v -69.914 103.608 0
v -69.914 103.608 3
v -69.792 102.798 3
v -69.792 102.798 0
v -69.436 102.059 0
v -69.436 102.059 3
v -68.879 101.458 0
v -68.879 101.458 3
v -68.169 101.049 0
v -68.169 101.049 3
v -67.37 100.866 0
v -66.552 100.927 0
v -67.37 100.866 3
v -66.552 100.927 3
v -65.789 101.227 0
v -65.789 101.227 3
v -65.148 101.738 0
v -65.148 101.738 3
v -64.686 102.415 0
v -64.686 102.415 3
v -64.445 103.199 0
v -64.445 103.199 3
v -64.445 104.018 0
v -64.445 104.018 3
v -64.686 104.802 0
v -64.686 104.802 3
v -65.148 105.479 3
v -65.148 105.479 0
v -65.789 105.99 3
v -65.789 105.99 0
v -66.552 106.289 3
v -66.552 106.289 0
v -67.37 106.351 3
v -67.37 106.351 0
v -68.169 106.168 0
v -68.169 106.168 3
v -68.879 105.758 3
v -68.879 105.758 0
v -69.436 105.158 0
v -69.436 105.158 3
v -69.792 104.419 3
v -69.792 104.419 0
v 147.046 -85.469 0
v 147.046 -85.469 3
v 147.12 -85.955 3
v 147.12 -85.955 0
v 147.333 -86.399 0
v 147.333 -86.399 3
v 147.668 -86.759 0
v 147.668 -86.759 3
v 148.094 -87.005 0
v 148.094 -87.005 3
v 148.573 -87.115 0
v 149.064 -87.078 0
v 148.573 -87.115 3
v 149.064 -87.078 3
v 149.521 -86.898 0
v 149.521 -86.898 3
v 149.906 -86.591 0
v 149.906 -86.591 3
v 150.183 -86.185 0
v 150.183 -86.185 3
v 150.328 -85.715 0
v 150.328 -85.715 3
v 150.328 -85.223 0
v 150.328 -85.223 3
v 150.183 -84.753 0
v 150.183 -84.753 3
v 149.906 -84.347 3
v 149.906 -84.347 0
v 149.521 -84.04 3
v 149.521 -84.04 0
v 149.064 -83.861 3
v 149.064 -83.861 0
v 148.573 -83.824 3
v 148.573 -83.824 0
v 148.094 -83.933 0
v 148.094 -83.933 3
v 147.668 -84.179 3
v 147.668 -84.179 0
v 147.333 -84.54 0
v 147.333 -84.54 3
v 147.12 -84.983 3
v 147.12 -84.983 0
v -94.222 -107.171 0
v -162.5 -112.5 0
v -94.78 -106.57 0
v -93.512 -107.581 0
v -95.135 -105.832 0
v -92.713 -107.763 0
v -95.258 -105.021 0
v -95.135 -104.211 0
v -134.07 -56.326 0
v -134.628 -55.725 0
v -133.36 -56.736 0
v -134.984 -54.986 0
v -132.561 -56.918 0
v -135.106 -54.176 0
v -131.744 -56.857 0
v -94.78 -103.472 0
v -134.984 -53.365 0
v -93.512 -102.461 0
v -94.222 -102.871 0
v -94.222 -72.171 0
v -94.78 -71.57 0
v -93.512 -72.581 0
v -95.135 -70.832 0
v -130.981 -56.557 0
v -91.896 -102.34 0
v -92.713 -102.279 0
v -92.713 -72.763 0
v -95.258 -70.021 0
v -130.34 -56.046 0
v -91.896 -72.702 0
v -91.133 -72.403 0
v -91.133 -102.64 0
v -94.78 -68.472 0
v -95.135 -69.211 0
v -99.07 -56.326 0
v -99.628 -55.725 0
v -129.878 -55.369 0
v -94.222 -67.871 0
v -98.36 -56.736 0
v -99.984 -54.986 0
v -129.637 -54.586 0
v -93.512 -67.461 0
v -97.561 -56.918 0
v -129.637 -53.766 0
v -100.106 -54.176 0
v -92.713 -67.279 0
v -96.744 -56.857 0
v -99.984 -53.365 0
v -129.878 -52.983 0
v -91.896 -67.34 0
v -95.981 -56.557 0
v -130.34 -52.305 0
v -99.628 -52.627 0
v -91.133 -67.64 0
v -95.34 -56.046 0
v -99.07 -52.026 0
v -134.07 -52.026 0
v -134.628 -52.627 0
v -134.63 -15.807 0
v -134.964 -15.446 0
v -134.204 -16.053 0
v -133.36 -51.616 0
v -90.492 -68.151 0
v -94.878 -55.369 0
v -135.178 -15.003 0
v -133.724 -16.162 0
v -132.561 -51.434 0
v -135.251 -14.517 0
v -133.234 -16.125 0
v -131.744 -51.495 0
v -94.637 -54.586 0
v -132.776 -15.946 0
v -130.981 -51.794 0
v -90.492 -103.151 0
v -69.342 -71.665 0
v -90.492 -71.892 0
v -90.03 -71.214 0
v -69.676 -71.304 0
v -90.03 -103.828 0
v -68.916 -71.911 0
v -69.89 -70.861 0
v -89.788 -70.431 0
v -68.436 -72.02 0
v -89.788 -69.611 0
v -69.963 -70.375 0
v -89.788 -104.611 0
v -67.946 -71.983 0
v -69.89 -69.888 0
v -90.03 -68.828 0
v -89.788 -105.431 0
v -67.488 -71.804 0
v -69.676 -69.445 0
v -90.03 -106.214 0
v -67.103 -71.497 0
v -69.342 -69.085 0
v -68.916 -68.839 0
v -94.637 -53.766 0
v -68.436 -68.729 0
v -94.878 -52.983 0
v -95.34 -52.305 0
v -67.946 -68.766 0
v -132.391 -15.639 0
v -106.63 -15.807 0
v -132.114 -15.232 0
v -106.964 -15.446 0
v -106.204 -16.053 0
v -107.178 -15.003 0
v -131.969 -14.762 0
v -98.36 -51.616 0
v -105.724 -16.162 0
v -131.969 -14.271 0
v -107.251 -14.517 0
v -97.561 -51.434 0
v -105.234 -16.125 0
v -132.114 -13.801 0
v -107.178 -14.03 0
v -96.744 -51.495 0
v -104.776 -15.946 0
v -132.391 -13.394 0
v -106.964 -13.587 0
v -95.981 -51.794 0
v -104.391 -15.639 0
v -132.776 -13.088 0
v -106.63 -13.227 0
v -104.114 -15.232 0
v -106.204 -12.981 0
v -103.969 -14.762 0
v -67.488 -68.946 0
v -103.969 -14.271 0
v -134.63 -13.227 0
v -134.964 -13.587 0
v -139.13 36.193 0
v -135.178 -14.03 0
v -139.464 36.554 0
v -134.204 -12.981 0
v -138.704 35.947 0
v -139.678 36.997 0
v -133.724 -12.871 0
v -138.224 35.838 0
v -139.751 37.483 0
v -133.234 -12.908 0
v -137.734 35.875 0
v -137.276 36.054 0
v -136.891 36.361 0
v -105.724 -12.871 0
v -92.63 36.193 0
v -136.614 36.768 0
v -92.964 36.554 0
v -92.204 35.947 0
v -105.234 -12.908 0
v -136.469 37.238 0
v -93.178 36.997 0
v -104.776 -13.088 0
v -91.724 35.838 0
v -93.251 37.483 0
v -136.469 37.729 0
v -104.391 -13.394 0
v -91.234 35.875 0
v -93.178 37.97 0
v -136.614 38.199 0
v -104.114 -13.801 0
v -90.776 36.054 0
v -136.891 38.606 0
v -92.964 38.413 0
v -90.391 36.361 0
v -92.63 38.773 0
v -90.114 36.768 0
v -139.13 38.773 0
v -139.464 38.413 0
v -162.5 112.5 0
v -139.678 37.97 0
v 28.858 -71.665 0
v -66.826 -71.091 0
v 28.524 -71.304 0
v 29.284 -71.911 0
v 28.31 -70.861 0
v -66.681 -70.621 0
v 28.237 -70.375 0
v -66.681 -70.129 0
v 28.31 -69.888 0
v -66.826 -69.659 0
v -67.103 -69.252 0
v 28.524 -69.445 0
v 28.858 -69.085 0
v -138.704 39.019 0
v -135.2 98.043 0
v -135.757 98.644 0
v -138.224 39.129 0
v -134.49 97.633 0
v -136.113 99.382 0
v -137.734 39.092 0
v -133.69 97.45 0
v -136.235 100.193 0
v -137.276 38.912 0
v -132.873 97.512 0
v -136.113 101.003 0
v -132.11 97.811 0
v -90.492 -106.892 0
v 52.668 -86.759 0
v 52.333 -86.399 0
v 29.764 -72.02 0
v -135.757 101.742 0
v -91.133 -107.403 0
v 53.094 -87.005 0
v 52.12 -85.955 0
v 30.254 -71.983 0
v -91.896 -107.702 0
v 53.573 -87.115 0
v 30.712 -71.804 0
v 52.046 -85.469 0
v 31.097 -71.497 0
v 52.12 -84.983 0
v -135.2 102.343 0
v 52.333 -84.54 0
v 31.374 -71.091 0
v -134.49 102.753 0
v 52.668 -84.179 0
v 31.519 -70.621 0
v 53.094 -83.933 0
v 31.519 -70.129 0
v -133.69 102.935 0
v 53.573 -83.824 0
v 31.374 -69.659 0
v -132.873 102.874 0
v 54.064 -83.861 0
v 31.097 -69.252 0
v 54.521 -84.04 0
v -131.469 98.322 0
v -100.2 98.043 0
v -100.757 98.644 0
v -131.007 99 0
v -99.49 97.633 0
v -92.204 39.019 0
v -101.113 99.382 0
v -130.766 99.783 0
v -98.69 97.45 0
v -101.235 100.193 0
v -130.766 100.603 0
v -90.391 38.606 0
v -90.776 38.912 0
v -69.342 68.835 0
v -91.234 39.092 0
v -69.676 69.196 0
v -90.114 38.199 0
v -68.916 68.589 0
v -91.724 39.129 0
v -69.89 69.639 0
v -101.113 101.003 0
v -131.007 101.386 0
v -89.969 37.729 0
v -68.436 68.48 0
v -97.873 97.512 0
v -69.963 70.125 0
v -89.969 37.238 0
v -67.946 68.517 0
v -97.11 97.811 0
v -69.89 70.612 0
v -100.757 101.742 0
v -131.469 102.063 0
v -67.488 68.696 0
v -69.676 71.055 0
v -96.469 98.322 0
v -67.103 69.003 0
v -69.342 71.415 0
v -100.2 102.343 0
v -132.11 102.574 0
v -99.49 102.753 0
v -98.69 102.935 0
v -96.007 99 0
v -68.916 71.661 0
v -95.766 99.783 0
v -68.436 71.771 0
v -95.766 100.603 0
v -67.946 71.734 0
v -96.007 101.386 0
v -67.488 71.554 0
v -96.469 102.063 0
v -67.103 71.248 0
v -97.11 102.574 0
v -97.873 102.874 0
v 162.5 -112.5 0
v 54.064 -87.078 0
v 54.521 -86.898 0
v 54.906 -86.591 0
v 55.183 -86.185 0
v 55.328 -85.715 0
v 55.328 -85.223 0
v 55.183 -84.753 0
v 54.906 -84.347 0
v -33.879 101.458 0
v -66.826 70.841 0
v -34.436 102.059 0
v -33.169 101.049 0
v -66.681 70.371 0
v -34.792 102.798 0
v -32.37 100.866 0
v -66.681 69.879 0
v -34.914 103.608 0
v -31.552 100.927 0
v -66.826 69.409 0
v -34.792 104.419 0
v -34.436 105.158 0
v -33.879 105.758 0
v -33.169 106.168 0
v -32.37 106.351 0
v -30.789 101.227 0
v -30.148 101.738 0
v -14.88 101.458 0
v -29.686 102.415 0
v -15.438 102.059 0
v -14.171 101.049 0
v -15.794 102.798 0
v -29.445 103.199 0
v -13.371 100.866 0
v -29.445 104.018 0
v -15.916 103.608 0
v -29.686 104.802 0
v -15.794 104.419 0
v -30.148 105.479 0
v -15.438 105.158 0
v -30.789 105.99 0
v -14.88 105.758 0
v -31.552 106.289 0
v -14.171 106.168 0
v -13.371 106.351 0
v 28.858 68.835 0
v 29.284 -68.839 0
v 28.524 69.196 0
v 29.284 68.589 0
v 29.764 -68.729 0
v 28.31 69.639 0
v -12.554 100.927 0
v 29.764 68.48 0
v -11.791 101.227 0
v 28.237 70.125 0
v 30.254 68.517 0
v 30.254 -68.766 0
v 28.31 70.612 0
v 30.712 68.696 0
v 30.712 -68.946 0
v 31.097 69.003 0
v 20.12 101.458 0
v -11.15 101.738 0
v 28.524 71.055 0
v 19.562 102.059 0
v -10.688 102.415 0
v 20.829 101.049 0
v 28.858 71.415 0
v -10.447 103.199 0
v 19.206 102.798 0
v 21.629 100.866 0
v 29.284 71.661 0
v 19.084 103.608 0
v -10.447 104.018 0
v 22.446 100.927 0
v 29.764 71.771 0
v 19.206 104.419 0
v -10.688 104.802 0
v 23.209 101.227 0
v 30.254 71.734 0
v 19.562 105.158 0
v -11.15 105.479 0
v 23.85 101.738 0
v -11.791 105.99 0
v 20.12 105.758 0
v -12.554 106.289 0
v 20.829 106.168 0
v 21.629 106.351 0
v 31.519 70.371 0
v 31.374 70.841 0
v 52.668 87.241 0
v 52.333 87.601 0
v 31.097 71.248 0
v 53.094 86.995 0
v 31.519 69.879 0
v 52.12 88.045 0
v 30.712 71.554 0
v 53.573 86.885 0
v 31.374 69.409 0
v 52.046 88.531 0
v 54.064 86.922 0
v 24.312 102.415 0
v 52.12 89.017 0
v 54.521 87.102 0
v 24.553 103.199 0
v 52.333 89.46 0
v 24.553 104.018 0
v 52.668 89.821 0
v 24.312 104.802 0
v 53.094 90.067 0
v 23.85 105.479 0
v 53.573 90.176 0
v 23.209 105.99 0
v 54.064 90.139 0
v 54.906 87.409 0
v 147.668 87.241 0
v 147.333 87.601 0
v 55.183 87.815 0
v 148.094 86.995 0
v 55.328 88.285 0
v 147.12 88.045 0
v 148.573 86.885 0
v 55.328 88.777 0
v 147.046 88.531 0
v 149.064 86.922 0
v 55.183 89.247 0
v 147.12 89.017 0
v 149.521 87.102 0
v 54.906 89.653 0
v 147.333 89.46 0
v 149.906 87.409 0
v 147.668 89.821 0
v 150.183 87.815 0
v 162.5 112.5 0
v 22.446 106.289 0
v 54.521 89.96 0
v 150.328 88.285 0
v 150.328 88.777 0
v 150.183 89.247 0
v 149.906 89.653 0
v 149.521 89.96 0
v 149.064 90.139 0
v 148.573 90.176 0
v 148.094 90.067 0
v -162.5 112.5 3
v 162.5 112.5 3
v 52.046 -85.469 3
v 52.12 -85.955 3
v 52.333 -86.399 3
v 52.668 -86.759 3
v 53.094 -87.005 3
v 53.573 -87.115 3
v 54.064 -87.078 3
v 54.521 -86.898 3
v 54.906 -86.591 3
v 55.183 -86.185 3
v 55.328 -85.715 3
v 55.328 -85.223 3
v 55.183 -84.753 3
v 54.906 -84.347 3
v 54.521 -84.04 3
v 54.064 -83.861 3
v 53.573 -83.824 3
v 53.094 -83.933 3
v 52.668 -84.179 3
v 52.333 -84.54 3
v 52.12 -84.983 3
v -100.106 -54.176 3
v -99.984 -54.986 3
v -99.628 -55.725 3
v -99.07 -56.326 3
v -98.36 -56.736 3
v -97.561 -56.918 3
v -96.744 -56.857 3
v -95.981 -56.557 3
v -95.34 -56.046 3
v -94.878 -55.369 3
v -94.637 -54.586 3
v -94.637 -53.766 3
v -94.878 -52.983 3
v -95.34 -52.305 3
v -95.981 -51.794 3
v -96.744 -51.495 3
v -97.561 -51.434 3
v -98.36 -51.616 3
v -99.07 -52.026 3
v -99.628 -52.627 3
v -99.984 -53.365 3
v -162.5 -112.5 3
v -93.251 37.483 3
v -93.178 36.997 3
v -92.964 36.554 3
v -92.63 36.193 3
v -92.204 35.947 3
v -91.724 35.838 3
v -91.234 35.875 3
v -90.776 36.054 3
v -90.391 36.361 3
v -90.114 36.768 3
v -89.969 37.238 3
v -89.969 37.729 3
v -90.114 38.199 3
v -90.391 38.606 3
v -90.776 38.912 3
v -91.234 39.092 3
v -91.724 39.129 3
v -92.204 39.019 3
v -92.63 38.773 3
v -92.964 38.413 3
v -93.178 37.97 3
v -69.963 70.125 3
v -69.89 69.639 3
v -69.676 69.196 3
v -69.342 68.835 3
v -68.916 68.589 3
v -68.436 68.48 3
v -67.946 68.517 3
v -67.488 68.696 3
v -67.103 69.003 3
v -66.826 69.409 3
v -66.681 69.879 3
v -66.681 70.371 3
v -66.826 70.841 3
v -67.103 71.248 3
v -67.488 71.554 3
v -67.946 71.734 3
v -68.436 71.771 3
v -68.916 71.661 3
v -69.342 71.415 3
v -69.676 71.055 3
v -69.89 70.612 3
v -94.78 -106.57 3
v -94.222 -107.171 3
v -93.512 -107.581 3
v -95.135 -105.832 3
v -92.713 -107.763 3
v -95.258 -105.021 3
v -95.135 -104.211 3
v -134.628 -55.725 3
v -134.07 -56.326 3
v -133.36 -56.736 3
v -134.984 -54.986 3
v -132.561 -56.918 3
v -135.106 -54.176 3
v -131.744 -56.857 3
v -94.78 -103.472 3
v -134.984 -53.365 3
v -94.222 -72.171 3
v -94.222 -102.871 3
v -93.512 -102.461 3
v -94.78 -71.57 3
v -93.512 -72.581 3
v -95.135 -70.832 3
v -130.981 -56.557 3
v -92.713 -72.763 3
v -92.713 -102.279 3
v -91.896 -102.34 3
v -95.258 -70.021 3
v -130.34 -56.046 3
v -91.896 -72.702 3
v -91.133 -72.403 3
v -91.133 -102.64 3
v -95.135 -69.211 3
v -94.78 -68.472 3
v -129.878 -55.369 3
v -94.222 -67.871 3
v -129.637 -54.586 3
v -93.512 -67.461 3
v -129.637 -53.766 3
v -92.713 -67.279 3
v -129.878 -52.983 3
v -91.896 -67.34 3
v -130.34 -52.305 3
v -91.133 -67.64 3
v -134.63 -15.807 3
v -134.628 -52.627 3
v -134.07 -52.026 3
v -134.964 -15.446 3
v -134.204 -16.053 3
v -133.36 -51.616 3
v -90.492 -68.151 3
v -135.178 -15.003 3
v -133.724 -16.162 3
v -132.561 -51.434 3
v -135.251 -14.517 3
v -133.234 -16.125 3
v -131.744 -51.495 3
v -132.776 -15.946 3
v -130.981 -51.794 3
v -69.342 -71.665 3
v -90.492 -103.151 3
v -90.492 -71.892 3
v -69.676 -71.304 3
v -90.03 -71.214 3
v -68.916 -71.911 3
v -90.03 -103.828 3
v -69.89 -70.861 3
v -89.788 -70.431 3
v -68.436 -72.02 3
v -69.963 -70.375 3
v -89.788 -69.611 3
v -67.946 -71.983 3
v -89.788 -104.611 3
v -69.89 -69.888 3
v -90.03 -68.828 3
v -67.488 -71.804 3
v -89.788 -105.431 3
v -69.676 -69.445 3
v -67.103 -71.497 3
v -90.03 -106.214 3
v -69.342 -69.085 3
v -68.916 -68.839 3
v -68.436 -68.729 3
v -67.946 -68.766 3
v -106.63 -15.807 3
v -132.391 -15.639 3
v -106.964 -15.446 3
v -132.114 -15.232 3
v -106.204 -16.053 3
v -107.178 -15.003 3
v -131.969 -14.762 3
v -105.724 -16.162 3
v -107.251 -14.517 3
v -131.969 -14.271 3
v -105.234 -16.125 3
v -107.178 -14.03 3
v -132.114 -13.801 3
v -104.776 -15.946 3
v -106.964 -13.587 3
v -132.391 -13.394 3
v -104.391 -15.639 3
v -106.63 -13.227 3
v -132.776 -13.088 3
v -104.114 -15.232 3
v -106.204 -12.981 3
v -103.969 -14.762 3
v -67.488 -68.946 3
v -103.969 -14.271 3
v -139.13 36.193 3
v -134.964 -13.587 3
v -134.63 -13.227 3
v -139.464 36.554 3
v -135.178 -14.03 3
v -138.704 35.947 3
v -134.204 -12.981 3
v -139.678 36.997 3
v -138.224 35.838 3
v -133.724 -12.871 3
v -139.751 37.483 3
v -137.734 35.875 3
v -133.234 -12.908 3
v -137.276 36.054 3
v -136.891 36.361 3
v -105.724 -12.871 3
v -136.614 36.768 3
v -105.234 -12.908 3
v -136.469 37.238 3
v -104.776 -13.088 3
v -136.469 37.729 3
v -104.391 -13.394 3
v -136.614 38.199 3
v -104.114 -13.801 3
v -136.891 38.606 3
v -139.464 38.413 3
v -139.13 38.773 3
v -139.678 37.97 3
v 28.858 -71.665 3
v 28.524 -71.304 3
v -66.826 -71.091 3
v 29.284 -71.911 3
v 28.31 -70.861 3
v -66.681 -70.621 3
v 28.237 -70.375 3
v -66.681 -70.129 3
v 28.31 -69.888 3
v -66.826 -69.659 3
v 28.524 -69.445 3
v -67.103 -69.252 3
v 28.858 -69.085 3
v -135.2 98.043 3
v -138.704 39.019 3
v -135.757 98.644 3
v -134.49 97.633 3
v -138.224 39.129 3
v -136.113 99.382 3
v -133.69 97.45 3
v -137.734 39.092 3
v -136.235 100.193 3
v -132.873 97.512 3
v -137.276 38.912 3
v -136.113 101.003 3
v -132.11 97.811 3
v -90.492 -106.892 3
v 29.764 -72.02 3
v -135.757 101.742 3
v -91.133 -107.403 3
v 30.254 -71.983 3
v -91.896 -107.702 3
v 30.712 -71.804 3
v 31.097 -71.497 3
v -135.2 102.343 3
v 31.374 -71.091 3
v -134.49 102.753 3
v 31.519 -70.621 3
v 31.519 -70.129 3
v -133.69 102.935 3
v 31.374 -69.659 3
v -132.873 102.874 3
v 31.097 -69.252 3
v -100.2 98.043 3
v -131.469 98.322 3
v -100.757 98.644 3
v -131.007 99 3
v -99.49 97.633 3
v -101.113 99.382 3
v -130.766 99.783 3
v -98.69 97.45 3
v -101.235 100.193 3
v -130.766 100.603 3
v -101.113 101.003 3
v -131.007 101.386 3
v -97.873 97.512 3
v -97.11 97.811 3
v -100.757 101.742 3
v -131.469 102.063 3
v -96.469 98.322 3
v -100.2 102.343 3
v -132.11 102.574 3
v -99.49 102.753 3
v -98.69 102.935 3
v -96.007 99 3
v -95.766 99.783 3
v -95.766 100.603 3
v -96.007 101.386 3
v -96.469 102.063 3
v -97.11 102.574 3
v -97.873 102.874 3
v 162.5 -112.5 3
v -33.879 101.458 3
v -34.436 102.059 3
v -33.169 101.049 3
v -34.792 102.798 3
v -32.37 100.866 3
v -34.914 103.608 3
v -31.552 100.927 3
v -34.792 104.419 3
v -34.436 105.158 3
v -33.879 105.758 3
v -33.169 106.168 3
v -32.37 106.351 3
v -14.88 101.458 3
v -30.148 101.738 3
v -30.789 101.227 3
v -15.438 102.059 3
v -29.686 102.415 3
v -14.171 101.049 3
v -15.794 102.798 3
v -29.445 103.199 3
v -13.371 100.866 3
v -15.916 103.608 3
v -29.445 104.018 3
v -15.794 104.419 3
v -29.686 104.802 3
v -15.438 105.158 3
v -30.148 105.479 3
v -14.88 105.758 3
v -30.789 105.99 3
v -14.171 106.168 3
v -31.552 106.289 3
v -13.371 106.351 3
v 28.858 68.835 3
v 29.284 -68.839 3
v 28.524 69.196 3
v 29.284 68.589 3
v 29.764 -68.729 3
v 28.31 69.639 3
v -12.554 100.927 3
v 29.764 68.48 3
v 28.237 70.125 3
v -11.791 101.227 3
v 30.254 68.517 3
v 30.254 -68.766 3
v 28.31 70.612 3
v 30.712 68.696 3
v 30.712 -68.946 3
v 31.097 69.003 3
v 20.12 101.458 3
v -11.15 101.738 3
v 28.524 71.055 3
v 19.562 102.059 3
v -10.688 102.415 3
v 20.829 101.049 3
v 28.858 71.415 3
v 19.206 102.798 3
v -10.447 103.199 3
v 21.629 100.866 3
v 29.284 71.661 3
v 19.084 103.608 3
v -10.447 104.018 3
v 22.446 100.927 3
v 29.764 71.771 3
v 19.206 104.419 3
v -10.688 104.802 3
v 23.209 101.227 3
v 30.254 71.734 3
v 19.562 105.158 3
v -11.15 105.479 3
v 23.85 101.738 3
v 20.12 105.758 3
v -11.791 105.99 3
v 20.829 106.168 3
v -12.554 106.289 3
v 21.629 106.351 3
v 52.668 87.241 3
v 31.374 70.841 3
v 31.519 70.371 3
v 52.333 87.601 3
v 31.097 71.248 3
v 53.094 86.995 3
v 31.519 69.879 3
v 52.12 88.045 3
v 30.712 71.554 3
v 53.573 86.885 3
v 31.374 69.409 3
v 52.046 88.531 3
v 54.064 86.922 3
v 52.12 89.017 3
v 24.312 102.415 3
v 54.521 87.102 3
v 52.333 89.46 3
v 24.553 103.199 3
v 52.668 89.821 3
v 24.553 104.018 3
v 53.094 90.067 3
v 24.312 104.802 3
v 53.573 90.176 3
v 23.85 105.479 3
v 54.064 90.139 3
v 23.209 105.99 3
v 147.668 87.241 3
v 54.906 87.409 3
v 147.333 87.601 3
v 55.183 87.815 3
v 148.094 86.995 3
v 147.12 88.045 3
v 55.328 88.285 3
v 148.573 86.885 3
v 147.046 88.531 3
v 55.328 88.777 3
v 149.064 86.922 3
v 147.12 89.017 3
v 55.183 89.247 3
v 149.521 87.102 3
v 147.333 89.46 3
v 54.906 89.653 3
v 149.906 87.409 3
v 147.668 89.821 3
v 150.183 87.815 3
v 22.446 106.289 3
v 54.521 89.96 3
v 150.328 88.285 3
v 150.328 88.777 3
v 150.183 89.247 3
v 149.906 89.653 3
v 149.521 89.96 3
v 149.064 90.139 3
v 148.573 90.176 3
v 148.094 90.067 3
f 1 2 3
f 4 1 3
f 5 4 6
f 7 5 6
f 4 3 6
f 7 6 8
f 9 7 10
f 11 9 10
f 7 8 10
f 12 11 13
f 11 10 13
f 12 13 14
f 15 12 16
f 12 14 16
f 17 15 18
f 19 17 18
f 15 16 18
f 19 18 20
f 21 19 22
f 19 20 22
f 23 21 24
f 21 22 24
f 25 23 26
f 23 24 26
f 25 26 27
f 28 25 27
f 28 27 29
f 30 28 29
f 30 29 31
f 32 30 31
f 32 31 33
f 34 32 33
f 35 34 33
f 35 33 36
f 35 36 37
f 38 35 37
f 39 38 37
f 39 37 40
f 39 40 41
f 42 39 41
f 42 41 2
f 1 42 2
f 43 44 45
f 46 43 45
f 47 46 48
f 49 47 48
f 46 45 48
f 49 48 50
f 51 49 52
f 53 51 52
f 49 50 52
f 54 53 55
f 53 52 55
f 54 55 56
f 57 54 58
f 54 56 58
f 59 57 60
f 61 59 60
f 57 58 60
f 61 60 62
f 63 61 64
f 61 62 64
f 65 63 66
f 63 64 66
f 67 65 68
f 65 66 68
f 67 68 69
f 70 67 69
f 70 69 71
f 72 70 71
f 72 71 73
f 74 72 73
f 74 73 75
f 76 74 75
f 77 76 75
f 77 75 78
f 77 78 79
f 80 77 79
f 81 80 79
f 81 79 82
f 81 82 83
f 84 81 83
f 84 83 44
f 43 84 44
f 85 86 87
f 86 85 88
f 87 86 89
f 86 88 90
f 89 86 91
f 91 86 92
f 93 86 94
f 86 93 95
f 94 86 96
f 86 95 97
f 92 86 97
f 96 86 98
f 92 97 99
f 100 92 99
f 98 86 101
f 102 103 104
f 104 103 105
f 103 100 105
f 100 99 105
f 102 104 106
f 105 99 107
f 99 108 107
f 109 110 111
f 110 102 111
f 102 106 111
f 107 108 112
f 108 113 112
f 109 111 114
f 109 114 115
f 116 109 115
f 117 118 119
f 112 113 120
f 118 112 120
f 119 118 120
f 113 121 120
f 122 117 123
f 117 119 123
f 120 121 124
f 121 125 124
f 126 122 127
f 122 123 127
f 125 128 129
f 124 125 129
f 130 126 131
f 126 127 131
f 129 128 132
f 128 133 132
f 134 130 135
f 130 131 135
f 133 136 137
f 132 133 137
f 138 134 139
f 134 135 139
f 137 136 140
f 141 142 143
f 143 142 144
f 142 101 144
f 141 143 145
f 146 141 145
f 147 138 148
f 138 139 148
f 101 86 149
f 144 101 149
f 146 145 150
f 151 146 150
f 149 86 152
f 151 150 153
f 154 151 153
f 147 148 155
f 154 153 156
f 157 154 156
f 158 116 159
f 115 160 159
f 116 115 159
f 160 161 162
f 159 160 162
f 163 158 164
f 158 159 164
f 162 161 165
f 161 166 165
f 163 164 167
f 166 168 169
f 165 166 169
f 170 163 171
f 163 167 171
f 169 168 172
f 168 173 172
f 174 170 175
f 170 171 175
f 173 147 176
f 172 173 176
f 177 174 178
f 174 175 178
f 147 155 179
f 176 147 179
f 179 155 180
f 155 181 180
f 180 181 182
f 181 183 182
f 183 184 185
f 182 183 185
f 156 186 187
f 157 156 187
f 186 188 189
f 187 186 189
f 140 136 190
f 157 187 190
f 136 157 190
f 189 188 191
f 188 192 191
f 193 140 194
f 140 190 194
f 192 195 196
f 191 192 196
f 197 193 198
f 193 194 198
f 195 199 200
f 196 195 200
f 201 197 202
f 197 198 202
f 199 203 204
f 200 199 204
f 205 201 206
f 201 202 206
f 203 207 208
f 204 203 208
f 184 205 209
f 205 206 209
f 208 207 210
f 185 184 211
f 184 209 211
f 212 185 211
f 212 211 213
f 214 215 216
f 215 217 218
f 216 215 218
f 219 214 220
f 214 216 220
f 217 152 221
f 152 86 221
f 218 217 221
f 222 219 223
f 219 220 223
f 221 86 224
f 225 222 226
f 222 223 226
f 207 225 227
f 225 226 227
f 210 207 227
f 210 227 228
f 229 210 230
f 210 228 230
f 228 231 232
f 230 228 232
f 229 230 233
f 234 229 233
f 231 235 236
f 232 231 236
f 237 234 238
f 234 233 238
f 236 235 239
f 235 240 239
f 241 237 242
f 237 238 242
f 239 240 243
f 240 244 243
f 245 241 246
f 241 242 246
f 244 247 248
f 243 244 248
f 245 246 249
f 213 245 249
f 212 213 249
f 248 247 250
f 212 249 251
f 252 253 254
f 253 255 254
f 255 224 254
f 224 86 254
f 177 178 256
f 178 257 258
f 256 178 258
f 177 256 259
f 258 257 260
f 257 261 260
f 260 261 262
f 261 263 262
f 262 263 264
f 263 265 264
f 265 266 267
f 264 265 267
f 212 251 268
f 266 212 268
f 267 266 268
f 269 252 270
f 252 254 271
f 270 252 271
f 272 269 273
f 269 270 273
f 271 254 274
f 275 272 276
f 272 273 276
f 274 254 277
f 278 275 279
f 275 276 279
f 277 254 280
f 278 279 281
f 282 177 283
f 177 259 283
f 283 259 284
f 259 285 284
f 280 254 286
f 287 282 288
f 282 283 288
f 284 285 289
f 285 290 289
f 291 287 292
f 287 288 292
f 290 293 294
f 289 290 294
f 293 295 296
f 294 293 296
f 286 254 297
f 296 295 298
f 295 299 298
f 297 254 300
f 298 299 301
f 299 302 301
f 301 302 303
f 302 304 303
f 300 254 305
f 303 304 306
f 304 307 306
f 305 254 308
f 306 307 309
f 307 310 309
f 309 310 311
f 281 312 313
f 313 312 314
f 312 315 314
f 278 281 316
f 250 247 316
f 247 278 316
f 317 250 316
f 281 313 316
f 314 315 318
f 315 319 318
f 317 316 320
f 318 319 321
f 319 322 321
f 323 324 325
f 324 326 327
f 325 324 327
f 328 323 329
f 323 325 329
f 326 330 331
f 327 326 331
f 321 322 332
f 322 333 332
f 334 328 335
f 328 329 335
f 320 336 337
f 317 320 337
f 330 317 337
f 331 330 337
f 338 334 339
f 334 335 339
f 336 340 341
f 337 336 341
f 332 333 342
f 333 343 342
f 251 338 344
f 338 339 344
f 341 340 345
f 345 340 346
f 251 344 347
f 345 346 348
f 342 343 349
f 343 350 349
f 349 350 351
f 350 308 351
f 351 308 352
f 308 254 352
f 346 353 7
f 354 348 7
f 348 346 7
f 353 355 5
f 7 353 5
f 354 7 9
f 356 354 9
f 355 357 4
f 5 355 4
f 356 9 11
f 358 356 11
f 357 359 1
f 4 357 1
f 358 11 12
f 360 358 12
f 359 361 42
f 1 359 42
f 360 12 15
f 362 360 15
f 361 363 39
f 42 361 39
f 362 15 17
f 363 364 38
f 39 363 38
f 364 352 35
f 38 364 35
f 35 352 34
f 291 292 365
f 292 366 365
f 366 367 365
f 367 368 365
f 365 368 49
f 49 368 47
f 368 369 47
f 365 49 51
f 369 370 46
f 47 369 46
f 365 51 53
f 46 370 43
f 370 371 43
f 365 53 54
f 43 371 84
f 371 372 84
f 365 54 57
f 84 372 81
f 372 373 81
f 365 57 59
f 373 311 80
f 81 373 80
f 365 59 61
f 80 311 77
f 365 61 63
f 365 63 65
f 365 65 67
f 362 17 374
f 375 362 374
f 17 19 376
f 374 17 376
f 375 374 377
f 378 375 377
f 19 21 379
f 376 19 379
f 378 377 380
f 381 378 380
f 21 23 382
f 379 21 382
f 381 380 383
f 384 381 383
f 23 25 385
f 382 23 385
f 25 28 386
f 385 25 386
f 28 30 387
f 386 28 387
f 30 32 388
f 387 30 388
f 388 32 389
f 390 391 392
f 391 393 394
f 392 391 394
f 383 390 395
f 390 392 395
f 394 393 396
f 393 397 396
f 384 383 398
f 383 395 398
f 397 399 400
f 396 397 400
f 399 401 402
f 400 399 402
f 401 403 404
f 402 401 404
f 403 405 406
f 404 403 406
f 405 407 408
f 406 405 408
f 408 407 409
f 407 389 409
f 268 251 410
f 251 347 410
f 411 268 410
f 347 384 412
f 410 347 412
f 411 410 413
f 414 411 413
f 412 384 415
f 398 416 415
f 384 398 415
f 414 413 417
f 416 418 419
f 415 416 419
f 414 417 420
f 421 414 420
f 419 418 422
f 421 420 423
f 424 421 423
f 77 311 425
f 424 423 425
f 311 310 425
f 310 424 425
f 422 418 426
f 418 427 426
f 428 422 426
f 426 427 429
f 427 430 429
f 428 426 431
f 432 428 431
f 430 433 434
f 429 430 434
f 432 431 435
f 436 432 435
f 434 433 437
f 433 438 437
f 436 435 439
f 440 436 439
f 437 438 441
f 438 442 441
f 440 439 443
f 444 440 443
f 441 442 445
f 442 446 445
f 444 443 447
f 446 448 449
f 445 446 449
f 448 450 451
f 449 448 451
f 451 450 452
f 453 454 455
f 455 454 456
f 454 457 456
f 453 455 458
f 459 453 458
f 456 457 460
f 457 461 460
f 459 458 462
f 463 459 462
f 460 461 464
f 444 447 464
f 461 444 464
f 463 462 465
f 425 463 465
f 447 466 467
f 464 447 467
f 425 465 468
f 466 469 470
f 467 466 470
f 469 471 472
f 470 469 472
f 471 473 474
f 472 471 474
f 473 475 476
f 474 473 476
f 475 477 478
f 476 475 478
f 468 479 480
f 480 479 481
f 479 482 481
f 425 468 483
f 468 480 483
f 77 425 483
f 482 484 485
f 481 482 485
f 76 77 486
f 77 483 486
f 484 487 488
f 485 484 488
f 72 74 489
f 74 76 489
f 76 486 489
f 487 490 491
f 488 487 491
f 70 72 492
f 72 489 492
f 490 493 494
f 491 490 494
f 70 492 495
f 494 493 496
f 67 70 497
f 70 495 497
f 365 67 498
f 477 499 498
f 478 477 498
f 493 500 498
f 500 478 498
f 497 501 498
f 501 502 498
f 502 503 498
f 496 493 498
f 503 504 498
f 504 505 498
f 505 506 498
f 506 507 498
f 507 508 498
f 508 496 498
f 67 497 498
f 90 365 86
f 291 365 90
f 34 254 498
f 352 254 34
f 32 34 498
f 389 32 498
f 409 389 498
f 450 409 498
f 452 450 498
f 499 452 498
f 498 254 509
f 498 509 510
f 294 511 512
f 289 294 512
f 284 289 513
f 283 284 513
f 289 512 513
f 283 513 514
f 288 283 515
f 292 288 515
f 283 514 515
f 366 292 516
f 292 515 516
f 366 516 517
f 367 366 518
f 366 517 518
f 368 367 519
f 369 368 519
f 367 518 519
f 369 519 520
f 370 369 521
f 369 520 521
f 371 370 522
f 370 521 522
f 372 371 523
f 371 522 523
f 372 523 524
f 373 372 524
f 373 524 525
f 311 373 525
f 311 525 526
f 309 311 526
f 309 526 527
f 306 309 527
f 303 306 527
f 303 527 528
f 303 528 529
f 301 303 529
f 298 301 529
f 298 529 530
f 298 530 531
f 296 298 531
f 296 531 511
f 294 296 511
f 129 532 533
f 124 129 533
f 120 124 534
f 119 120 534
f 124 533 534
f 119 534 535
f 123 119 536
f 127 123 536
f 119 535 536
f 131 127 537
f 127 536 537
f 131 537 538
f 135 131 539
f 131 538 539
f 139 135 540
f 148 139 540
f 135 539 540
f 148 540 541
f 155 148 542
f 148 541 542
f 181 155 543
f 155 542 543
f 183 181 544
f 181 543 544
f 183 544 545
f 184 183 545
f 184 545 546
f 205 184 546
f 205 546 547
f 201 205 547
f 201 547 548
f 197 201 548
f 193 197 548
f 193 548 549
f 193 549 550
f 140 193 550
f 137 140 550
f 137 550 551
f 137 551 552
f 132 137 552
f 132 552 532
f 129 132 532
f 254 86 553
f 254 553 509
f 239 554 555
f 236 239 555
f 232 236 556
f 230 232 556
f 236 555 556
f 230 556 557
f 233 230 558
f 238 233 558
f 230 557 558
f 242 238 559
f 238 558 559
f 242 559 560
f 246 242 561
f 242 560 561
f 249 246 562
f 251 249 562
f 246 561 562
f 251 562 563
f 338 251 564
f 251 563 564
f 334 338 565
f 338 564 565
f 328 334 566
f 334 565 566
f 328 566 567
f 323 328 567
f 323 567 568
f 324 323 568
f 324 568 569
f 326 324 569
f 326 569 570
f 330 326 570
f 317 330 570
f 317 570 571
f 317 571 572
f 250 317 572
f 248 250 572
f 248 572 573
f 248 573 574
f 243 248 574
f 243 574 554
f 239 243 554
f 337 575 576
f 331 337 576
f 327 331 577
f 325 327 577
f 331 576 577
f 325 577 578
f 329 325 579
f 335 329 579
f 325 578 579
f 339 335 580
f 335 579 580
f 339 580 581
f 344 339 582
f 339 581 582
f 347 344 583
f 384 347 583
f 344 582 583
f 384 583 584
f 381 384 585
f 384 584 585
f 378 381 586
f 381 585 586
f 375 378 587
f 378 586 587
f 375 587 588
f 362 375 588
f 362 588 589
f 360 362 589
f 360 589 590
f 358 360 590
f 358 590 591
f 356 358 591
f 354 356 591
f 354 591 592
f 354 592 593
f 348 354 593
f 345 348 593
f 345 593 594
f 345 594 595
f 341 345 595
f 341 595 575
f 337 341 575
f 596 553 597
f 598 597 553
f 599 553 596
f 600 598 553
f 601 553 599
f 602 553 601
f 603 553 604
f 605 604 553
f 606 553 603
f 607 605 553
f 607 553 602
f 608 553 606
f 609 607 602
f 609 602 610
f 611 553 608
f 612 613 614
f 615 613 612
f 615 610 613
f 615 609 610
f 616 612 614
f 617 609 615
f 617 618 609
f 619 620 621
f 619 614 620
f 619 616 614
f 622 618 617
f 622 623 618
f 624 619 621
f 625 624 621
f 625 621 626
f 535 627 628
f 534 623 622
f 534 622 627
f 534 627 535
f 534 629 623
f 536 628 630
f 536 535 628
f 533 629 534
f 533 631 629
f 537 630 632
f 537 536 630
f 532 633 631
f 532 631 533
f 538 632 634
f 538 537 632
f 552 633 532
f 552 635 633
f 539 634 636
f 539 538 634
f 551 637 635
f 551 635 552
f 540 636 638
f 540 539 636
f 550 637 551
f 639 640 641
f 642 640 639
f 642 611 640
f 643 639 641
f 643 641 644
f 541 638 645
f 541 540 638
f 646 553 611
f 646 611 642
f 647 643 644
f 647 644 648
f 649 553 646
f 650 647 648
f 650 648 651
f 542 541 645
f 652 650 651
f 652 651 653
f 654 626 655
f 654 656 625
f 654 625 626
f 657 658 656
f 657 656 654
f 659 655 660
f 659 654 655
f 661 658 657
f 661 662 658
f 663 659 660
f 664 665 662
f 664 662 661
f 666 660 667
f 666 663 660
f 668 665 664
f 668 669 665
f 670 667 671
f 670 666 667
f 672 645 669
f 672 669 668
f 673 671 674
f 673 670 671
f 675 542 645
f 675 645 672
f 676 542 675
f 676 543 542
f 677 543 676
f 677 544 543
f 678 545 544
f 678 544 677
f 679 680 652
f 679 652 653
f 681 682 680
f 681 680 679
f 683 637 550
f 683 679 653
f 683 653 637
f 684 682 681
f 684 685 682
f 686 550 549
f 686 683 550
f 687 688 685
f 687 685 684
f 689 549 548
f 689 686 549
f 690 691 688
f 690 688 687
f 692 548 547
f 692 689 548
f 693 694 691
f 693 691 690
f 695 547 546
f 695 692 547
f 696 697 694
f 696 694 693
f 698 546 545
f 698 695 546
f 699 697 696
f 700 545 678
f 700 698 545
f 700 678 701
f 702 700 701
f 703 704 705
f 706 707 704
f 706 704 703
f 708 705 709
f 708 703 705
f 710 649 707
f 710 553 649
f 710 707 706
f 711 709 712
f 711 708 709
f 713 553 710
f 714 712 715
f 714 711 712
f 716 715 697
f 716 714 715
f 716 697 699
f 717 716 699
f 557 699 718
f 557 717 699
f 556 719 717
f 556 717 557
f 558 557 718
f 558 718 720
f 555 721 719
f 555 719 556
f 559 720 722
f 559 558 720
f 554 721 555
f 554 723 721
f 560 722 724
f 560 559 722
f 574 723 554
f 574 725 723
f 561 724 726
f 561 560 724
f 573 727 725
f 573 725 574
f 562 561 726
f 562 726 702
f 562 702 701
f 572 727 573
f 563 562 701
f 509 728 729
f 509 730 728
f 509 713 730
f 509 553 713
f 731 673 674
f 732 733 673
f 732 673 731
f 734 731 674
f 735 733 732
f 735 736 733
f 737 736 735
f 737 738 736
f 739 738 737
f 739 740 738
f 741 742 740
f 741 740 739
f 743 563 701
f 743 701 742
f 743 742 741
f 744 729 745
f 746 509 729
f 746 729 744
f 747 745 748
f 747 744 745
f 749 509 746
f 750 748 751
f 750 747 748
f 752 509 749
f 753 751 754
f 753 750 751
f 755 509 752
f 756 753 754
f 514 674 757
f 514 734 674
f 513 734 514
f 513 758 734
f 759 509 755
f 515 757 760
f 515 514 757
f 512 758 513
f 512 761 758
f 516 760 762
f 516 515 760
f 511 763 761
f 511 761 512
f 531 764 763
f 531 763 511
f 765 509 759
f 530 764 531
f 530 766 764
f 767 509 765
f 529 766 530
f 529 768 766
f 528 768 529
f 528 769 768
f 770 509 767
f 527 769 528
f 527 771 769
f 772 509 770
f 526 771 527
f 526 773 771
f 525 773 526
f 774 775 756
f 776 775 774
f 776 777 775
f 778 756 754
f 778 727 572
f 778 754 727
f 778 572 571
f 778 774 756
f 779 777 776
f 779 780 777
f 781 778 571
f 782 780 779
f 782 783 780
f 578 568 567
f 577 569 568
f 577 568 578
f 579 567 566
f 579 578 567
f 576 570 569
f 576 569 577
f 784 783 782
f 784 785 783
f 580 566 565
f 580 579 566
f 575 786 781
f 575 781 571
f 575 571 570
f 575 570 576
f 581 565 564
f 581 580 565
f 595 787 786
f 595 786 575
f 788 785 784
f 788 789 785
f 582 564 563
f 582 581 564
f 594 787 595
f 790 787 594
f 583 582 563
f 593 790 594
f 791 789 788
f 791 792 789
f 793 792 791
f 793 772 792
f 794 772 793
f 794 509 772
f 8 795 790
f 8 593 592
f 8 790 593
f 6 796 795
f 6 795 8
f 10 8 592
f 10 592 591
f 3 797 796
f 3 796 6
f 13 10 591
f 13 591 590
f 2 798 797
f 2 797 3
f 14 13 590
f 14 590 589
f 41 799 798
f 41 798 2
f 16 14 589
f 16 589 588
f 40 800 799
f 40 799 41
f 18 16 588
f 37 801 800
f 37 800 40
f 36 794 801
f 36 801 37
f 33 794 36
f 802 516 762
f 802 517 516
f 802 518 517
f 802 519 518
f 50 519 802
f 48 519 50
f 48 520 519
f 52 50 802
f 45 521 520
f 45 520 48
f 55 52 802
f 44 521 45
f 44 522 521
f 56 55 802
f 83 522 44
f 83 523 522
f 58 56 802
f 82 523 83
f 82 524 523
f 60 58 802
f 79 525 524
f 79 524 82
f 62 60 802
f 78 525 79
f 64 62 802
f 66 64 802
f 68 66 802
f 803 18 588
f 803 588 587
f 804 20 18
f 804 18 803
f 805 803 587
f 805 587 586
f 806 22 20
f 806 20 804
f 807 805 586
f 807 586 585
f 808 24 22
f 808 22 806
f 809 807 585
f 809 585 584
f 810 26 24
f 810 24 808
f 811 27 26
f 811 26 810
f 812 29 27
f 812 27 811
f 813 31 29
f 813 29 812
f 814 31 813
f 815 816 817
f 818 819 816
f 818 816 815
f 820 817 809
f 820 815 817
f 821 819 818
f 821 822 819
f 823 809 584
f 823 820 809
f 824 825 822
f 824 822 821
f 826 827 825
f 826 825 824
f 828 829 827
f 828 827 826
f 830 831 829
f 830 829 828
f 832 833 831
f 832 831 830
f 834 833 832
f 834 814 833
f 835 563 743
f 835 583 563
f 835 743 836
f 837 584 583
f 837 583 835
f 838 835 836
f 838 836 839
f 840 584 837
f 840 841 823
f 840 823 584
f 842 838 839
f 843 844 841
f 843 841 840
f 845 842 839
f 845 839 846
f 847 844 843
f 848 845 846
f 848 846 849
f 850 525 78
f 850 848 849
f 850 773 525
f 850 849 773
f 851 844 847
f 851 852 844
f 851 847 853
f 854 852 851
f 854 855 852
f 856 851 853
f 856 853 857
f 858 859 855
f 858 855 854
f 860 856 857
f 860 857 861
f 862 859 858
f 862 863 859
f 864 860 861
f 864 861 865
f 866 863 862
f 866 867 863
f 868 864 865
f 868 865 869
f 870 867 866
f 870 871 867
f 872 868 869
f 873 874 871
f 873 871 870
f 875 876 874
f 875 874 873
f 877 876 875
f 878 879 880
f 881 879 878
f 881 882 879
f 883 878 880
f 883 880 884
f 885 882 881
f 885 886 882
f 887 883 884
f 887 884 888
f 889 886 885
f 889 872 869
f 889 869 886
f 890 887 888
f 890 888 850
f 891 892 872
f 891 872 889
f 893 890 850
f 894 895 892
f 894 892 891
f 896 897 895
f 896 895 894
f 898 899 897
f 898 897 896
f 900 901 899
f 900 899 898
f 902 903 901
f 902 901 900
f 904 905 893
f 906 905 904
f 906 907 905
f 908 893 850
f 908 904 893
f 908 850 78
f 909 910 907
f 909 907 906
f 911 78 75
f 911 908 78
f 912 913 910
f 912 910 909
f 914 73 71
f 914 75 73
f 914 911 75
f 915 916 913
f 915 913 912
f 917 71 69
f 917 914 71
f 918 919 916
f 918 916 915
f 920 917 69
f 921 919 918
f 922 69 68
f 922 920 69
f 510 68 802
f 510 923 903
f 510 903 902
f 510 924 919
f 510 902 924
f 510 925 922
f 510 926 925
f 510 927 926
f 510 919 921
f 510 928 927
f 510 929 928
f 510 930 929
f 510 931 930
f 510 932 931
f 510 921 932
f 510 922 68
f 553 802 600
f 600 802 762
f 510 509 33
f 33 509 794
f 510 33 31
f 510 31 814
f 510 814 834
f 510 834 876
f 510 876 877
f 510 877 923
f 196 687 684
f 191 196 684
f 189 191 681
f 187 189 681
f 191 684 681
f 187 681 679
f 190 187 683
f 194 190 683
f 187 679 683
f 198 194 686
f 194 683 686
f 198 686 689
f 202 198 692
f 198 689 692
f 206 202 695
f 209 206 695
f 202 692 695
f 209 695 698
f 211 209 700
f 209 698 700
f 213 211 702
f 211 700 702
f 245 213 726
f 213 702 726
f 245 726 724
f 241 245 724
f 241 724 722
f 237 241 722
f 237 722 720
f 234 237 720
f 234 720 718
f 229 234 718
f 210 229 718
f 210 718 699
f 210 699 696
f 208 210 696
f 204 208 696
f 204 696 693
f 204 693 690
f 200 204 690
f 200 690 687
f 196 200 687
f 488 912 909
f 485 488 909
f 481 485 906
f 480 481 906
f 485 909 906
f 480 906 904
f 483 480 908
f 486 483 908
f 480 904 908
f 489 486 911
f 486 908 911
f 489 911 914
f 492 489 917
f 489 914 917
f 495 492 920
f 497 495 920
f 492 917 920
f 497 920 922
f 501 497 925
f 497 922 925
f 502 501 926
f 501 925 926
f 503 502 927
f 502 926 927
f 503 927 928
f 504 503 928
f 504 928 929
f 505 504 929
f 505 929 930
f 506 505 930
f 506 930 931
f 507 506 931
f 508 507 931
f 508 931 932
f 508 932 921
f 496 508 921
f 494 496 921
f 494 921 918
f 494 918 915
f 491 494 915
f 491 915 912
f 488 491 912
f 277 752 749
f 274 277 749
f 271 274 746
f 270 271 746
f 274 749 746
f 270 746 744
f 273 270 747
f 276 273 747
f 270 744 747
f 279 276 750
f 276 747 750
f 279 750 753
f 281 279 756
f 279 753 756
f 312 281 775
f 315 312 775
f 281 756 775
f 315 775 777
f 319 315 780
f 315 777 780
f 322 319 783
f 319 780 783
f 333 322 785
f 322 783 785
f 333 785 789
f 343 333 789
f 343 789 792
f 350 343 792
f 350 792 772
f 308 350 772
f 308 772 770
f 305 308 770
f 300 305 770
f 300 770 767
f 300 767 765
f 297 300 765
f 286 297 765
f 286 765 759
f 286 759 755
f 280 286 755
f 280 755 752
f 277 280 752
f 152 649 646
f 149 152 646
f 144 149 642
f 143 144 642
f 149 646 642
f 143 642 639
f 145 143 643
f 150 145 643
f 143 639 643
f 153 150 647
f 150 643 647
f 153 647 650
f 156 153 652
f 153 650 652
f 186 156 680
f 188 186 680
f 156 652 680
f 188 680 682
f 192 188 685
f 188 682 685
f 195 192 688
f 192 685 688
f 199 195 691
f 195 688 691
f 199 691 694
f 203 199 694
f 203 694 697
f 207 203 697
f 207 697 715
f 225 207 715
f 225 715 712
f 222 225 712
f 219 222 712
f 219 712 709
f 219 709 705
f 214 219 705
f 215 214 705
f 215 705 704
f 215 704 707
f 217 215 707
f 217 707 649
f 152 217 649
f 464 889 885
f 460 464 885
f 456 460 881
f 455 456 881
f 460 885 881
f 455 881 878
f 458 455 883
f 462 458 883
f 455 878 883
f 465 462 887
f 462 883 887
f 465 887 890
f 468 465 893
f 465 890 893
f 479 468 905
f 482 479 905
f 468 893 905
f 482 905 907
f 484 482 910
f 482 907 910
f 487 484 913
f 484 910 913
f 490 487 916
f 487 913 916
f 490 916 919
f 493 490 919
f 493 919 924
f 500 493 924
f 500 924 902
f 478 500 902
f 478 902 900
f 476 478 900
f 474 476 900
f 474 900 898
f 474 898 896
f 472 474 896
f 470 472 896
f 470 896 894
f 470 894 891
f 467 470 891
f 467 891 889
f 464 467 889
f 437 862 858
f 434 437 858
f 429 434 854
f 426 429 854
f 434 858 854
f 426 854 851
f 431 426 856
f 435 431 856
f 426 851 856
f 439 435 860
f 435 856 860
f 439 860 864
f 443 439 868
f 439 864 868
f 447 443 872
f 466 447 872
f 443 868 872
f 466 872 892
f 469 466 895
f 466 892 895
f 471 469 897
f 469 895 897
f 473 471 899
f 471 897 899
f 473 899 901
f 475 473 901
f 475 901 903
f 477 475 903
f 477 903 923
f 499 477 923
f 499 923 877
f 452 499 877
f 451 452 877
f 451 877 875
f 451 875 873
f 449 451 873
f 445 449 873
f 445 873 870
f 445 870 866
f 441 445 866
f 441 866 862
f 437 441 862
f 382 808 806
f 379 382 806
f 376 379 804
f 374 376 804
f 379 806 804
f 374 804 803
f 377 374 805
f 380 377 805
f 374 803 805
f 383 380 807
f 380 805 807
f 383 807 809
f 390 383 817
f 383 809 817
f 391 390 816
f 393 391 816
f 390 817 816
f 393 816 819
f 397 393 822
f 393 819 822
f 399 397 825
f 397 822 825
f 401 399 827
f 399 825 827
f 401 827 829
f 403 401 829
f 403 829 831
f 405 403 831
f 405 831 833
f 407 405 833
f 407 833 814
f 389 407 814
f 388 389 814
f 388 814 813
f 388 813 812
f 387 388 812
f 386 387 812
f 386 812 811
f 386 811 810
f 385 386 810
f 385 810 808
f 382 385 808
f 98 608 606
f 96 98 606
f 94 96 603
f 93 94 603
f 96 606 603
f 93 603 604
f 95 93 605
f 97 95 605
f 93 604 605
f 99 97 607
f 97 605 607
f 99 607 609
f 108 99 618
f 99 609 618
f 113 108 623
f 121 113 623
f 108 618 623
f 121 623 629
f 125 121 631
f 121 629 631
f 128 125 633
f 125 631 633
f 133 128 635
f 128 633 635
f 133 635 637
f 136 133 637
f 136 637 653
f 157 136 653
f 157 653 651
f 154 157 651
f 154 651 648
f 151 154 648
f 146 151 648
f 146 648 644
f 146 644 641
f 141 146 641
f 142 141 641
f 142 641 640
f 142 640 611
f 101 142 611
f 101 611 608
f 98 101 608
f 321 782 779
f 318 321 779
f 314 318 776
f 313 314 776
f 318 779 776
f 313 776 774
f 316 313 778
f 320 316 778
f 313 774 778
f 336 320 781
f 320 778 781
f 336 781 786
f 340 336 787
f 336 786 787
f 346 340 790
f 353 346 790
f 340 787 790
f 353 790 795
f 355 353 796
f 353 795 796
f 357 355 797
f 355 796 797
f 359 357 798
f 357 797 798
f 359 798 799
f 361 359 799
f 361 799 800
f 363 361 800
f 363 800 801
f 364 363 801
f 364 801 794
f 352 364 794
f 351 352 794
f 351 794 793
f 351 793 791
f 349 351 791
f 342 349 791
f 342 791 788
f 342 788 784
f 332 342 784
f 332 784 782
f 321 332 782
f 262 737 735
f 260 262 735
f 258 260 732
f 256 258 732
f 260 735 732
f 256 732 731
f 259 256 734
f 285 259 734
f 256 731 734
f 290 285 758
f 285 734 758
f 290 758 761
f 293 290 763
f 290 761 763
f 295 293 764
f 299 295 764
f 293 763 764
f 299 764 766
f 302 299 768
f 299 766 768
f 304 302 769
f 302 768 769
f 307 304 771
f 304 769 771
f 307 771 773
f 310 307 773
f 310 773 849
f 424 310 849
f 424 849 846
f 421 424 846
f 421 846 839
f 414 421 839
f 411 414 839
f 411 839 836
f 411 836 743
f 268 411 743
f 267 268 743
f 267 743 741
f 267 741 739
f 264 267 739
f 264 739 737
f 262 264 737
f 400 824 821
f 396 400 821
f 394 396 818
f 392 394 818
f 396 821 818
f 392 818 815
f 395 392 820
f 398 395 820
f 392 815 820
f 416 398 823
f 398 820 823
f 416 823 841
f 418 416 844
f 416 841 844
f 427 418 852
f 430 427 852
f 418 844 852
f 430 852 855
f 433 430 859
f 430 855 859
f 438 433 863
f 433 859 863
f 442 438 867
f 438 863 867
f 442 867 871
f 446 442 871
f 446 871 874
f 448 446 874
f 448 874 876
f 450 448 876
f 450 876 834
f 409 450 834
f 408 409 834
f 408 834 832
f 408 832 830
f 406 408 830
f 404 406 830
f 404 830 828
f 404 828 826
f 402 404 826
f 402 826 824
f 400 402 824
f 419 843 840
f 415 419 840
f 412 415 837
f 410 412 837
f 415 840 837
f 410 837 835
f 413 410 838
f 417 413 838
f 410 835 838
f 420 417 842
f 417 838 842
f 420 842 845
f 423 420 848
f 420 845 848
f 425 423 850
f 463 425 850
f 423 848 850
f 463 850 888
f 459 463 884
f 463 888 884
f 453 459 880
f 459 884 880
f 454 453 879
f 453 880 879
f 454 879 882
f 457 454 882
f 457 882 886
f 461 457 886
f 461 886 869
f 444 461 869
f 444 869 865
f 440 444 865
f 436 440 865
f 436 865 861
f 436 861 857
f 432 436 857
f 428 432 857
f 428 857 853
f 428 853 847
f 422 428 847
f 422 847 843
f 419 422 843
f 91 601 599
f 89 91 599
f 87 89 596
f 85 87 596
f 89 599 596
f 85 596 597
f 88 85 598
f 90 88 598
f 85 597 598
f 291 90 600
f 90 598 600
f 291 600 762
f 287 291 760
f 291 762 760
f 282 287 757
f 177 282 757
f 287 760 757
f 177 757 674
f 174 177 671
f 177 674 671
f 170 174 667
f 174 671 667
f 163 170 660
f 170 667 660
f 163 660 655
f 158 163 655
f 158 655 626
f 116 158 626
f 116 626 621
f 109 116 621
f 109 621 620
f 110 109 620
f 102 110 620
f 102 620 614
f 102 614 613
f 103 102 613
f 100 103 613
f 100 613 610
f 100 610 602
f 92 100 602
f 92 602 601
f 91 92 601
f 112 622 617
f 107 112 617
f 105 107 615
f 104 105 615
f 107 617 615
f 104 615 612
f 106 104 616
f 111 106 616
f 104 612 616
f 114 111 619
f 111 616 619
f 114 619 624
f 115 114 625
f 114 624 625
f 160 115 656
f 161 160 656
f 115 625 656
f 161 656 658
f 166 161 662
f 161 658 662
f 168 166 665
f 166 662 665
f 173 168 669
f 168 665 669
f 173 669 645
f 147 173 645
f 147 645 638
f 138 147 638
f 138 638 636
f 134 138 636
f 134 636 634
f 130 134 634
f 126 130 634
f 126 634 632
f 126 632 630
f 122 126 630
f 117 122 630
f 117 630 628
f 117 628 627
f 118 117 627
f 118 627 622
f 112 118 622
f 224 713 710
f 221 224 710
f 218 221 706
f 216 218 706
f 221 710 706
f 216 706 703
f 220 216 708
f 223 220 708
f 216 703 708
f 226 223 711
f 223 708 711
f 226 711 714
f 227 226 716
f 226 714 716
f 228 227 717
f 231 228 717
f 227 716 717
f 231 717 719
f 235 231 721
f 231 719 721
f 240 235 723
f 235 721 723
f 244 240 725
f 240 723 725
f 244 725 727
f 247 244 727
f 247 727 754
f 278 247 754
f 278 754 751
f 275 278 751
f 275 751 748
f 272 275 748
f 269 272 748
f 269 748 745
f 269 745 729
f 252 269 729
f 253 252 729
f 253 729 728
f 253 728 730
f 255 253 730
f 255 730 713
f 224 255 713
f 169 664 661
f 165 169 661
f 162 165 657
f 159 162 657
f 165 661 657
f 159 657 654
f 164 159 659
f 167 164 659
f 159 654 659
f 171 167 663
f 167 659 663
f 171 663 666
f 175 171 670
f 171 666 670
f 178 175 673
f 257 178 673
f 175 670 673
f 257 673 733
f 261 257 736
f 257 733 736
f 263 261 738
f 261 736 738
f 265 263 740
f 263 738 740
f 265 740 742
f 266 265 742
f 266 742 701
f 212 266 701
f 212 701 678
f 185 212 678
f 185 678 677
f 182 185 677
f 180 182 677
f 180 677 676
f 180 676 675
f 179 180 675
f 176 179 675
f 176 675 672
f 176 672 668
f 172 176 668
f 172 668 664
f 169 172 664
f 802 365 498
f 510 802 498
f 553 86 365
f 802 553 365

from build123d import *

# Parameters (mm, degrees)
F0_W     = 325
F0_H     = 225
F1_DEPTH = 3
F2_D     = 3.3
F2_DEPTH = 15
F2_TIP   = 0.9914200214
F3_D     = 5.5
F3_DEPTH = 15
F3_TIP   = 1.6523667023


with BuildPart() as f1:
    # F0 (on Top) → F1 (new body)
    with BuildSketch(Plane.XY):
        Rectangle(F0_W, F0_H)
    extrude(amount=F1_DEPTH)

    # F2
    with Locations(Plane(origin=(0, 0, 0), x_dir=(1, 0, 0), z_dir=(0, 0, -1))):
        with Locations((148.6963902414, -88.5308509469), (53.6963902414, -88.5308509469), (148.6963902414, 85.4691490531), (53.6963902414, 85.4691490531), (-68.3129802346, -70.1252296567), (29.8870197654, -70.1252296567), (29.8870197654, 70.3747703433), (-68.3129802346, 70.3747703433), (-91.600900948, -37.483430326), (-105.600900948, 14.516569674), (-133.600900948, 14.516569674), (-138.100900948, -37.483430326)):
            Hole(F2_D / 2, depth=F2_DEPTH)
            with Locations((0, 0, -(F2_DEPTH + F2_TIP / 2))):  # 118° drill point
                Cone(0, F2_D / 2, F2_TIP, mode=Mode.SUBTRACT)

    # F3
    with Locations(Plane(origin=(0, 0, 0), x_dir=(1, 0, 0), z_dir=(0, 0, -1))):
        with Locations((-133.4849408269, -100.1927629113), (-98.4849408269, -100.1927629113), (-67.1641564369, -103.6084368825), (-32.1641564369, -103.6084368825), (-13.1658734754, -103.6084368825), (21.8341265246, -103.6084368825), (-92.5075262785, 70.0210854411), (-92.5075262785, 105.0210854411), (-97.3557943106, 54.175902158), (-132.3557943106, 54.175902158)):
            Hole(F3_D / 2, depth=F3_DEPTH)
            with Locations((0, 0, -(F3_DEPTH + F3_TIP / 2))):  # 118° drill point
                Cone(0, F3_D / 2, F3_TIP, mode=Mode.SUBTRACT)


solid = f1.part
